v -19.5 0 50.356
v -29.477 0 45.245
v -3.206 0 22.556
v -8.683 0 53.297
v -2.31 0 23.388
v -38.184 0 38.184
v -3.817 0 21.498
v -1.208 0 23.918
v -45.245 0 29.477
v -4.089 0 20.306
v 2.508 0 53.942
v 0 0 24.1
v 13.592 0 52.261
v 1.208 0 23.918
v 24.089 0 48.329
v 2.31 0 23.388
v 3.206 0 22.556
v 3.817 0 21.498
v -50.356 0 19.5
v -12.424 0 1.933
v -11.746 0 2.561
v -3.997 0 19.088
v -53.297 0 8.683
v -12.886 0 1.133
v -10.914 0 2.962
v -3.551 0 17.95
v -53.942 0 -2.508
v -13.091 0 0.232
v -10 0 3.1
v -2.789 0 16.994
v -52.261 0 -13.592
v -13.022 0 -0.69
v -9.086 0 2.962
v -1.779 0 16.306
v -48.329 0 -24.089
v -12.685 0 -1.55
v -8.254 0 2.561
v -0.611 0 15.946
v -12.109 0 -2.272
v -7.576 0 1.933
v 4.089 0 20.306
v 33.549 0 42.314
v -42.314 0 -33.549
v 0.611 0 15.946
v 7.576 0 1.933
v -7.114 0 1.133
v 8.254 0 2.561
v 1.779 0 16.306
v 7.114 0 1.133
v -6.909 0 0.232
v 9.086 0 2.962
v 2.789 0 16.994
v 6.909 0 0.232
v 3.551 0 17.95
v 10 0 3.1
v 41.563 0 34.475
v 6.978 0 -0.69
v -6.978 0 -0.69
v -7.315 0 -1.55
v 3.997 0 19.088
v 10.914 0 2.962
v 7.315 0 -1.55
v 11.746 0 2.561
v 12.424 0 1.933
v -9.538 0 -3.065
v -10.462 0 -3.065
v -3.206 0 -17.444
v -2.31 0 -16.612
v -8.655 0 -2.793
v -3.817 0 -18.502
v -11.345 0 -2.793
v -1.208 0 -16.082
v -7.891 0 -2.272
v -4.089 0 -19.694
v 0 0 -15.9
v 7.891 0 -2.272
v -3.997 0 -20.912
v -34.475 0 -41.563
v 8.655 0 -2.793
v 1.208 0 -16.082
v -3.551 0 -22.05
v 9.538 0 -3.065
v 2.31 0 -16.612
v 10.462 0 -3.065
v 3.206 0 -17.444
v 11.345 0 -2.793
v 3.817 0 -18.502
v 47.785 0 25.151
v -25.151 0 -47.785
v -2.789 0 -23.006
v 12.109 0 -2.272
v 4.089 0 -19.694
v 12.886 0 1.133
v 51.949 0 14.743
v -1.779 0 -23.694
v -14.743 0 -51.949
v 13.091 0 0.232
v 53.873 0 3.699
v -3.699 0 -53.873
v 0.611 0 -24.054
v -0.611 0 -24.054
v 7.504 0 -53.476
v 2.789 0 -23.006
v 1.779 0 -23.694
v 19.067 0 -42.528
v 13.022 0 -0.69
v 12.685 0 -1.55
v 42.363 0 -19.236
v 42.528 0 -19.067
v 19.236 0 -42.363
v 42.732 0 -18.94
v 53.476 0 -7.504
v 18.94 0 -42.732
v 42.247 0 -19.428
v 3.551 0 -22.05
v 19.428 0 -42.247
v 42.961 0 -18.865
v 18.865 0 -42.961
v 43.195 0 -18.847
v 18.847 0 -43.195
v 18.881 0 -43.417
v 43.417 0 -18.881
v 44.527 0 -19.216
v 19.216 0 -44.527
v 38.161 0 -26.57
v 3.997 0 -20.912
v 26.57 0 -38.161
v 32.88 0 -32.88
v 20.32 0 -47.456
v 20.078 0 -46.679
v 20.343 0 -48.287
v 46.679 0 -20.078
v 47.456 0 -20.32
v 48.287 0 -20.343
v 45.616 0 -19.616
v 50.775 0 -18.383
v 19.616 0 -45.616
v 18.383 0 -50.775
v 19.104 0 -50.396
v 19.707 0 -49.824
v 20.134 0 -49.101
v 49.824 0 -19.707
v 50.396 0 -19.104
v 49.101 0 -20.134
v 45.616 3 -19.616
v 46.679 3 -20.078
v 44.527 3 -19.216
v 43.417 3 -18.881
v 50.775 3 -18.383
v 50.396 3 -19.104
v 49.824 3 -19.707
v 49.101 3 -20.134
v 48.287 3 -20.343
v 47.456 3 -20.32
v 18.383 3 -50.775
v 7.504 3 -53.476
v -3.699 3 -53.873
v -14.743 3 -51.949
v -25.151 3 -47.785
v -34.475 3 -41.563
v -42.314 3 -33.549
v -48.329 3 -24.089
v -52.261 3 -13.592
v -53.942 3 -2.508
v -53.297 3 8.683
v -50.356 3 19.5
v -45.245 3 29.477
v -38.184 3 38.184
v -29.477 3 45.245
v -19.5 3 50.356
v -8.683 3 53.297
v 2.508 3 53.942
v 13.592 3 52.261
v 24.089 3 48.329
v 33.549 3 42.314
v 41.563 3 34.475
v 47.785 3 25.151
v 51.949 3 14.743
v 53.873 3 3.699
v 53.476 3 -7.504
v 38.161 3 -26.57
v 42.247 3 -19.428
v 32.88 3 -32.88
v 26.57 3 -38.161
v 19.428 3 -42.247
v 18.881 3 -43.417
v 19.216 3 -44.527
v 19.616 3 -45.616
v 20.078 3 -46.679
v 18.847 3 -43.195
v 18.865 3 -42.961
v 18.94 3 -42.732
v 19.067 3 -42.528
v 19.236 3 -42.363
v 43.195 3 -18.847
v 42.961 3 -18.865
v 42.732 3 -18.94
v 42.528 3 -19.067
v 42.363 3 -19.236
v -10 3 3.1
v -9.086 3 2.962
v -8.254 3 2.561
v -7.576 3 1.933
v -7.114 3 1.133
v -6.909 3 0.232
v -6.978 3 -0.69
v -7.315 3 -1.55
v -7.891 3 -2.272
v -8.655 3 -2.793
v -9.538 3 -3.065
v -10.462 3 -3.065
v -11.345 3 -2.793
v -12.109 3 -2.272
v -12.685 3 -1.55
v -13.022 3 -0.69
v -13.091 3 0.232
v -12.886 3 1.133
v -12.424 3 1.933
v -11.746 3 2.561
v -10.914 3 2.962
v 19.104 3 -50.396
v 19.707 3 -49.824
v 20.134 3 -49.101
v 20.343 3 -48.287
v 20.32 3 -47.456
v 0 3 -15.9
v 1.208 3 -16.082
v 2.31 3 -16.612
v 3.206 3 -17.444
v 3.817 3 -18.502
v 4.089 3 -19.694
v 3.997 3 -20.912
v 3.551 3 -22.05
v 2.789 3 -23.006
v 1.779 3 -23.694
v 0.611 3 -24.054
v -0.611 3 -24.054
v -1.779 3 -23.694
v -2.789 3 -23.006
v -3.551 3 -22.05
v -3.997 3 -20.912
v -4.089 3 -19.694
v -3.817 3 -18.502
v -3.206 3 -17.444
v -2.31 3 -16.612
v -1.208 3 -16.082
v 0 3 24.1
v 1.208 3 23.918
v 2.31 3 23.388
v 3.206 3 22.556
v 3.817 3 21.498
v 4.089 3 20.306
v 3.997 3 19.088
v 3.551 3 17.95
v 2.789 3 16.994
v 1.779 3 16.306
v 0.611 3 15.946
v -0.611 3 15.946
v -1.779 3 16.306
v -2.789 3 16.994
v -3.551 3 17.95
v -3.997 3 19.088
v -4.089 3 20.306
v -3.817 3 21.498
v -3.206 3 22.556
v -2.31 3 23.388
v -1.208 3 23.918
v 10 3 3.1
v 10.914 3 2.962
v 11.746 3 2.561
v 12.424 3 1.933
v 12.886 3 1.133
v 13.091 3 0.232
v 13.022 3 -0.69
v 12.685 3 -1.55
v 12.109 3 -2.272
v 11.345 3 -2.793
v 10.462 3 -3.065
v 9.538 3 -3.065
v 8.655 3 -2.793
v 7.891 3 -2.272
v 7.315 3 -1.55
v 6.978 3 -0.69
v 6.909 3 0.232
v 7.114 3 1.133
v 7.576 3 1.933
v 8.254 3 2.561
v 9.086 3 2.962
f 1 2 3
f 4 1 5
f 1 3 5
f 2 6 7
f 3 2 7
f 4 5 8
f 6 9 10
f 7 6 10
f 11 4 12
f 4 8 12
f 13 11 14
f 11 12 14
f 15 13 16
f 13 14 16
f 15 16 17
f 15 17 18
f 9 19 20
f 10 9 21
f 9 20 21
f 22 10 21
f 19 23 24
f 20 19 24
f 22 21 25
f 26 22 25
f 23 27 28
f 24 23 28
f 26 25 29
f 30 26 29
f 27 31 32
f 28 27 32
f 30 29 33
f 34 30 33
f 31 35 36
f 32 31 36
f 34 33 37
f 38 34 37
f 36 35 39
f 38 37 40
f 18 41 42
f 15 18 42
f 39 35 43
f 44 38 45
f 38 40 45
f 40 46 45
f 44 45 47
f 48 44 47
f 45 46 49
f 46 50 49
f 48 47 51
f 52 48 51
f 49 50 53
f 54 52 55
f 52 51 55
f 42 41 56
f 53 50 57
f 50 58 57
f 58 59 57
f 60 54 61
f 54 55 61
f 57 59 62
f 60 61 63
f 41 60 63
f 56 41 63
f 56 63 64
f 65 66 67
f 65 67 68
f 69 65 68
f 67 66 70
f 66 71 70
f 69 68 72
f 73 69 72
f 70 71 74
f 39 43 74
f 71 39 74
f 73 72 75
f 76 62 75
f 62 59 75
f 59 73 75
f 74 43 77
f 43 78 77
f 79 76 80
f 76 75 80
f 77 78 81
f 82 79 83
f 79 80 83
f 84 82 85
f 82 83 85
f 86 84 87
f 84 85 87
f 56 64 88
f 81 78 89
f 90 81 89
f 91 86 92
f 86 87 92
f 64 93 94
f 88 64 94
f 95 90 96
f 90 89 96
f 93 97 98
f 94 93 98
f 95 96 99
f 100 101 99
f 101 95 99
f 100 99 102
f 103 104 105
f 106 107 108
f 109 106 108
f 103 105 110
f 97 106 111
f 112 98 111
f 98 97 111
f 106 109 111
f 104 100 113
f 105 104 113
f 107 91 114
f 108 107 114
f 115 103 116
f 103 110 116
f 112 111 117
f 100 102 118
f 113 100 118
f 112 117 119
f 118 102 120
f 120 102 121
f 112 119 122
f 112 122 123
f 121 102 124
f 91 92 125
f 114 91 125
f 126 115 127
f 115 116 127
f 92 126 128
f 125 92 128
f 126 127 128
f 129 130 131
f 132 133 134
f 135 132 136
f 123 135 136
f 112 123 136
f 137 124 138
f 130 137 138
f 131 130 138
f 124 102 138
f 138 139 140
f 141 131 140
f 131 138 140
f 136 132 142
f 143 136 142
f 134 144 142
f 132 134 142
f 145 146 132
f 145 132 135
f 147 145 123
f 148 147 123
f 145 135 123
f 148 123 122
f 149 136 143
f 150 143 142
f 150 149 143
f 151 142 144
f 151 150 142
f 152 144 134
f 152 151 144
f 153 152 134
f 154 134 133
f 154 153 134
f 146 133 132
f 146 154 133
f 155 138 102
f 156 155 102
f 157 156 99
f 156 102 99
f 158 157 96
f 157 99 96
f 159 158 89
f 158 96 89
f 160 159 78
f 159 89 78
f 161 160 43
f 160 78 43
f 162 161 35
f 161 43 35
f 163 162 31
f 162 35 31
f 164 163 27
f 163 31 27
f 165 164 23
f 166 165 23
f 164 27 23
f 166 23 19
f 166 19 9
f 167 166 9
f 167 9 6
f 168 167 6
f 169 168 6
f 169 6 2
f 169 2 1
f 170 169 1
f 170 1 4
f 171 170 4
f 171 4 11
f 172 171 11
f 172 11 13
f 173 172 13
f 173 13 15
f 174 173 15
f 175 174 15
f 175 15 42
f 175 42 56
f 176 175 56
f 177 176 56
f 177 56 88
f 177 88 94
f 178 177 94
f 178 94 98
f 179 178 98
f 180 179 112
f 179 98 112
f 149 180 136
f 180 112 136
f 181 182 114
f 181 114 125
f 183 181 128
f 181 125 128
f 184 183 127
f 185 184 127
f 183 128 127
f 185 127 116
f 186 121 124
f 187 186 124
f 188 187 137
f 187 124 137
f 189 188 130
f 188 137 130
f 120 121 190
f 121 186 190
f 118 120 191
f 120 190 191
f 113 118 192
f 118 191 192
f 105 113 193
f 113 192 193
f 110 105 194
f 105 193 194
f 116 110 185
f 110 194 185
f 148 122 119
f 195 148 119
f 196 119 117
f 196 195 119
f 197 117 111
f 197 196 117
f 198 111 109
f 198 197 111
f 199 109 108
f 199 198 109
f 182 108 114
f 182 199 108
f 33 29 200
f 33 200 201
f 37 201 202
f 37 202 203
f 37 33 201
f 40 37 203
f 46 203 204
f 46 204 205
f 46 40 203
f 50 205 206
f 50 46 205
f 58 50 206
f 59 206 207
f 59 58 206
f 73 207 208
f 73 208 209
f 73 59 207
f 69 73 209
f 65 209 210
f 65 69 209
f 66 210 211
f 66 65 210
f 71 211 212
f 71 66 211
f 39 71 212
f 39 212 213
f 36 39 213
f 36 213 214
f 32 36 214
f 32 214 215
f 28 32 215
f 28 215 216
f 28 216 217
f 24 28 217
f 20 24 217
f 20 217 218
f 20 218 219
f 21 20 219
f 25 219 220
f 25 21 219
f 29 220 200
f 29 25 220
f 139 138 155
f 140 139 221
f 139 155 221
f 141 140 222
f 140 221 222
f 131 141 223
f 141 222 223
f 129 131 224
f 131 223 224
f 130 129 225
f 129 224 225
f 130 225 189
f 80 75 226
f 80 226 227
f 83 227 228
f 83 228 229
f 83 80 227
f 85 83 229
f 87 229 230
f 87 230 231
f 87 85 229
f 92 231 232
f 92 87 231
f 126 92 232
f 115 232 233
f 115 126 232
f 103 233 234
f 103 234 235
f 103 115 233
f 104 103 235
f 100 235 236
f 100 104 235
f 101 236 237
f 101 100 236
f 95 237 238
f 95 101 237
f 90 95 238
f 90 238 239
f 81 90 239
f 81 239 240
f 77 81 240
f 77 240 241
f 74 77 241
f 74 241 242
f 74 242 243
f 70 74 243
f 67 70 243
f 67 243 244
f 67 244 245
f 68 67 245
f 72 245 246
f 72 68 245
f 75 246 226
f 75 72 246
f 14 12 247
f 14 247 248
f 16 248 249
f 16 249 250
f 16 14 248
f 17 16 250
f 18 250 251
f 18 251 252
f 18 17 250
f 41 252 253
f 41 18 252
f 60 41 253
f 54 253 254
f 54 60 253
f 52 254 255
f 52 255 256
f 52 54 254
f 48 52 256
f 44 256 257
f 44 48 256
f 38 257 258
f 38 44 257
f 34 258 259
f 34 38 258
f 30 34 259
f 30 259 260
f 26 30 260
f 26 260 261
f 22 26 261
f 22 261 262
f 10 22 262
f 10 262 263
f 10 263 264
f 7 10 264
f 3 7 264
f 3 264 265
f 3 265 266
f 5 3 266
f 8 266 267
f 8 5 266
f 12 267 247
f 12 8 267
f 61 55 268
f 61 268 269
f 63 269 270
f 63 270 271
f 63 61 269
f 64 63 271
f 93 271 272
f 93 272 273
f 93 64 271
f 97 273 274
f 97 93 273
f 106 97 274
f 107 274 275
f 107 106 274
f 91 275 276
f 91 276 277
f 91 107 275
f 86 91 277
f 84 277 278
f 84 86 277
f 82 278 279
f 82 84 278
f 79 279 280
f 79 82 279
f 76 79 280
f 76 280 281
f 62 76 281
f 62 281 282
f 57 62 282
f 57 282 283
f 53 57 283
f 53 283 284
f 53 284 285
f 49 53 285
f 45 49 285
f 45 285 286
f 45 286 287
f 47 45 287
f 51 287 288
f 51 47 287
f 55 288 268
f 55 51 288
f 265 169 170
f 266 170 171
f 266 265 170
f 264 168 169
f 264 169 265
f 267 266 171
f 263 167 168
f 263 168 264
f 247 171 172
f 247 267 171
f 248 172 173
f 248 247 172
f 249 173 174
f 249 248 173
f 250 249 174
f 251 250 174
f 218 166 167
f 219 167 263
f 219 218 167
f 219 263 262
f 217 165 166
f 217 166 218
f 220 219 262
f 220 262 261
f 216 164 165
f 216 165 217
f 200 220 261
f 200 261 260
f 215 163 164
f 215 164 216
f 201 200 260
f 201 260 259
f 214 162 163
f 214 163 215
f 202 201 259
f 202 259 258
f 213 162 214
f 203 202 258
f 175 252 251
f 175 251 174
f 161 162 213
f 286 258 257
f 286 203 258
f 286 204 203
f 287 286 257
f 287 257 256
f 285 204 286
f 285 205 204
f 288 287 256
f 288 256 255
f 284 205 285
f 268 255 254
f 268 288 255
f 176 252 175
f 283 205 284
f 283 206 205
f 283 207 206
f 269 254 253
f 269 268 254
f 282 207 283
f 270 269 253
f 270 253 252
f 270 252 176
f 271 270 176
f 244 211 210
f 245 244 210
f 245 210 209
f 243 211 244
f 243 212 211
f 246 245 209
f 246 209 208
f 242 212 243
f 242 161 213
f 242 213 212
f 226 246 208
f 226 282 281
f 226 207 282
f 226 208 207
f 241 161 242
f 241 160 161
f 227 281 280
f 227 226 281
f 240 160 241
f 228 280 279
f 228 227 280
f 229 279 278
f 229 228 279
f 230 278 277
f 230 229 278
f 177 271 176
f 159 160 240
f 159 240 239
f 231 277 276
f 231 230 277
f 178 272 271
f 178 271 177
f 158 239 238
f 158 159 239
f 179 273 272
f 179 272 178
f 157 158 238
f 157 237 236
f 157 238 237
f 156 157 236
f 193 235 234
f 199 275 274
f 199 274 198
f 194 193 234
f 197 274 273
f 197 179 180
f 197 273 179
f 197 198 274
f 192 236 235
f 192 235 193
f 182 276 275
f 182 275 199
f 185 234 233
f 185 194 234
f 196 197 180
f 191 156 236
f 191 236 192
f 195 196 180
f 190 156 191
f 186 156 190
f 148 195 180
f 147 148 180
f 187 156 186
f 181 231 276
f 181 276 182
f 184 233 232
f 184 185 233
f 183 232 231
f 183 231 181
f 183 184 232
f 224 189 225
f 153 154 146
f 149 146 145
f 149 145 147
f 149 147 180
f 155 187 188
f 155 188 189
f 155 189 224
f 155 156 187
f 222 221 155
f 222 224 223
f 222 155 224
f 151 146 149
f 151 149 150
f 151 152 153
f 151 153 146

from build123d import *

# Parameters (mm, degrees)
SKETCH1_R           = 3.1
SKETCH1_R_2         = 4.1
BOSS_EXTRUDE1_DEPTH = 3
FILLET1_R           = 3
FILLET2_R           = 1


with BuildPart() as part:
    # Sketch1 → Boss-Extrude1 (new body)
    with BuildSketch(Plane(origin=(0, 0, 0), x_dir=(1, 0, 0), z_dir=(0, 1, 0))):
        with BuildLine():
            ThreePointArc((21.667324002, 49.462380357), (-38.183766184, -38.183766184), (49.462380357, 21.667324002))
            ThreePointArc((49.462380357, 21.667324002), (46.165505457, 19.845504593), (42.585510083, 18.674162122))
            ThreePointArc((42.585510083, 18.674162122), (32.880465325, 32.880465325), (18.674162122, 42.585510083))
            ThreePointArc((18.674162122, 42.585510083), (19.845504593, 46.165505457), (21.667324002, 49.462380357))
        make_face()
        with Locations(Location((10, 0, 0), (0, 0, 270))):
            Circle(SKETCH1_R, mode=Mode.SUBTRACT)
        with Locations(Location((0, 20, 0), (0, 0, 270))):
            Circle(SKETCH1_R_2, mode=Mode.SUBTRACT)
        with Locations(Location((0, -20, 0), (0, 0, 270))):
            Circle(SKETCH1_R_2, mode=Mode.SUBTRACT)
        with Locations(Location((-10, 0, 0), (0, 0, 270))):
            Circle(SKETCH1_R, mode=Mode.SUBTRACT)
    extrude(amount=BOSS_EXTRUDE1_DEPTH)

    # Fillet1
    fillet1_edges = [part.edges().sort_by_distance(p)[0] for p in [
        (49.462380357, 1.5, -21.667324002),
        (21.667324002, 1.5, -49.462380357),
    ]]
    fillet(fillet1_edges, radius=FILLET1_R)

    # Fillet2
    fillet2_edges = [part.edges().sort_by_distance(p)[0] for p in [
        (18.674162122, 1.5, -42.585510083),
        (42.585510083, 1.5, -18.674162122),
    ]]
    fillet(fillet2_edges, radius=FILLET2_R)


solid = part.part
